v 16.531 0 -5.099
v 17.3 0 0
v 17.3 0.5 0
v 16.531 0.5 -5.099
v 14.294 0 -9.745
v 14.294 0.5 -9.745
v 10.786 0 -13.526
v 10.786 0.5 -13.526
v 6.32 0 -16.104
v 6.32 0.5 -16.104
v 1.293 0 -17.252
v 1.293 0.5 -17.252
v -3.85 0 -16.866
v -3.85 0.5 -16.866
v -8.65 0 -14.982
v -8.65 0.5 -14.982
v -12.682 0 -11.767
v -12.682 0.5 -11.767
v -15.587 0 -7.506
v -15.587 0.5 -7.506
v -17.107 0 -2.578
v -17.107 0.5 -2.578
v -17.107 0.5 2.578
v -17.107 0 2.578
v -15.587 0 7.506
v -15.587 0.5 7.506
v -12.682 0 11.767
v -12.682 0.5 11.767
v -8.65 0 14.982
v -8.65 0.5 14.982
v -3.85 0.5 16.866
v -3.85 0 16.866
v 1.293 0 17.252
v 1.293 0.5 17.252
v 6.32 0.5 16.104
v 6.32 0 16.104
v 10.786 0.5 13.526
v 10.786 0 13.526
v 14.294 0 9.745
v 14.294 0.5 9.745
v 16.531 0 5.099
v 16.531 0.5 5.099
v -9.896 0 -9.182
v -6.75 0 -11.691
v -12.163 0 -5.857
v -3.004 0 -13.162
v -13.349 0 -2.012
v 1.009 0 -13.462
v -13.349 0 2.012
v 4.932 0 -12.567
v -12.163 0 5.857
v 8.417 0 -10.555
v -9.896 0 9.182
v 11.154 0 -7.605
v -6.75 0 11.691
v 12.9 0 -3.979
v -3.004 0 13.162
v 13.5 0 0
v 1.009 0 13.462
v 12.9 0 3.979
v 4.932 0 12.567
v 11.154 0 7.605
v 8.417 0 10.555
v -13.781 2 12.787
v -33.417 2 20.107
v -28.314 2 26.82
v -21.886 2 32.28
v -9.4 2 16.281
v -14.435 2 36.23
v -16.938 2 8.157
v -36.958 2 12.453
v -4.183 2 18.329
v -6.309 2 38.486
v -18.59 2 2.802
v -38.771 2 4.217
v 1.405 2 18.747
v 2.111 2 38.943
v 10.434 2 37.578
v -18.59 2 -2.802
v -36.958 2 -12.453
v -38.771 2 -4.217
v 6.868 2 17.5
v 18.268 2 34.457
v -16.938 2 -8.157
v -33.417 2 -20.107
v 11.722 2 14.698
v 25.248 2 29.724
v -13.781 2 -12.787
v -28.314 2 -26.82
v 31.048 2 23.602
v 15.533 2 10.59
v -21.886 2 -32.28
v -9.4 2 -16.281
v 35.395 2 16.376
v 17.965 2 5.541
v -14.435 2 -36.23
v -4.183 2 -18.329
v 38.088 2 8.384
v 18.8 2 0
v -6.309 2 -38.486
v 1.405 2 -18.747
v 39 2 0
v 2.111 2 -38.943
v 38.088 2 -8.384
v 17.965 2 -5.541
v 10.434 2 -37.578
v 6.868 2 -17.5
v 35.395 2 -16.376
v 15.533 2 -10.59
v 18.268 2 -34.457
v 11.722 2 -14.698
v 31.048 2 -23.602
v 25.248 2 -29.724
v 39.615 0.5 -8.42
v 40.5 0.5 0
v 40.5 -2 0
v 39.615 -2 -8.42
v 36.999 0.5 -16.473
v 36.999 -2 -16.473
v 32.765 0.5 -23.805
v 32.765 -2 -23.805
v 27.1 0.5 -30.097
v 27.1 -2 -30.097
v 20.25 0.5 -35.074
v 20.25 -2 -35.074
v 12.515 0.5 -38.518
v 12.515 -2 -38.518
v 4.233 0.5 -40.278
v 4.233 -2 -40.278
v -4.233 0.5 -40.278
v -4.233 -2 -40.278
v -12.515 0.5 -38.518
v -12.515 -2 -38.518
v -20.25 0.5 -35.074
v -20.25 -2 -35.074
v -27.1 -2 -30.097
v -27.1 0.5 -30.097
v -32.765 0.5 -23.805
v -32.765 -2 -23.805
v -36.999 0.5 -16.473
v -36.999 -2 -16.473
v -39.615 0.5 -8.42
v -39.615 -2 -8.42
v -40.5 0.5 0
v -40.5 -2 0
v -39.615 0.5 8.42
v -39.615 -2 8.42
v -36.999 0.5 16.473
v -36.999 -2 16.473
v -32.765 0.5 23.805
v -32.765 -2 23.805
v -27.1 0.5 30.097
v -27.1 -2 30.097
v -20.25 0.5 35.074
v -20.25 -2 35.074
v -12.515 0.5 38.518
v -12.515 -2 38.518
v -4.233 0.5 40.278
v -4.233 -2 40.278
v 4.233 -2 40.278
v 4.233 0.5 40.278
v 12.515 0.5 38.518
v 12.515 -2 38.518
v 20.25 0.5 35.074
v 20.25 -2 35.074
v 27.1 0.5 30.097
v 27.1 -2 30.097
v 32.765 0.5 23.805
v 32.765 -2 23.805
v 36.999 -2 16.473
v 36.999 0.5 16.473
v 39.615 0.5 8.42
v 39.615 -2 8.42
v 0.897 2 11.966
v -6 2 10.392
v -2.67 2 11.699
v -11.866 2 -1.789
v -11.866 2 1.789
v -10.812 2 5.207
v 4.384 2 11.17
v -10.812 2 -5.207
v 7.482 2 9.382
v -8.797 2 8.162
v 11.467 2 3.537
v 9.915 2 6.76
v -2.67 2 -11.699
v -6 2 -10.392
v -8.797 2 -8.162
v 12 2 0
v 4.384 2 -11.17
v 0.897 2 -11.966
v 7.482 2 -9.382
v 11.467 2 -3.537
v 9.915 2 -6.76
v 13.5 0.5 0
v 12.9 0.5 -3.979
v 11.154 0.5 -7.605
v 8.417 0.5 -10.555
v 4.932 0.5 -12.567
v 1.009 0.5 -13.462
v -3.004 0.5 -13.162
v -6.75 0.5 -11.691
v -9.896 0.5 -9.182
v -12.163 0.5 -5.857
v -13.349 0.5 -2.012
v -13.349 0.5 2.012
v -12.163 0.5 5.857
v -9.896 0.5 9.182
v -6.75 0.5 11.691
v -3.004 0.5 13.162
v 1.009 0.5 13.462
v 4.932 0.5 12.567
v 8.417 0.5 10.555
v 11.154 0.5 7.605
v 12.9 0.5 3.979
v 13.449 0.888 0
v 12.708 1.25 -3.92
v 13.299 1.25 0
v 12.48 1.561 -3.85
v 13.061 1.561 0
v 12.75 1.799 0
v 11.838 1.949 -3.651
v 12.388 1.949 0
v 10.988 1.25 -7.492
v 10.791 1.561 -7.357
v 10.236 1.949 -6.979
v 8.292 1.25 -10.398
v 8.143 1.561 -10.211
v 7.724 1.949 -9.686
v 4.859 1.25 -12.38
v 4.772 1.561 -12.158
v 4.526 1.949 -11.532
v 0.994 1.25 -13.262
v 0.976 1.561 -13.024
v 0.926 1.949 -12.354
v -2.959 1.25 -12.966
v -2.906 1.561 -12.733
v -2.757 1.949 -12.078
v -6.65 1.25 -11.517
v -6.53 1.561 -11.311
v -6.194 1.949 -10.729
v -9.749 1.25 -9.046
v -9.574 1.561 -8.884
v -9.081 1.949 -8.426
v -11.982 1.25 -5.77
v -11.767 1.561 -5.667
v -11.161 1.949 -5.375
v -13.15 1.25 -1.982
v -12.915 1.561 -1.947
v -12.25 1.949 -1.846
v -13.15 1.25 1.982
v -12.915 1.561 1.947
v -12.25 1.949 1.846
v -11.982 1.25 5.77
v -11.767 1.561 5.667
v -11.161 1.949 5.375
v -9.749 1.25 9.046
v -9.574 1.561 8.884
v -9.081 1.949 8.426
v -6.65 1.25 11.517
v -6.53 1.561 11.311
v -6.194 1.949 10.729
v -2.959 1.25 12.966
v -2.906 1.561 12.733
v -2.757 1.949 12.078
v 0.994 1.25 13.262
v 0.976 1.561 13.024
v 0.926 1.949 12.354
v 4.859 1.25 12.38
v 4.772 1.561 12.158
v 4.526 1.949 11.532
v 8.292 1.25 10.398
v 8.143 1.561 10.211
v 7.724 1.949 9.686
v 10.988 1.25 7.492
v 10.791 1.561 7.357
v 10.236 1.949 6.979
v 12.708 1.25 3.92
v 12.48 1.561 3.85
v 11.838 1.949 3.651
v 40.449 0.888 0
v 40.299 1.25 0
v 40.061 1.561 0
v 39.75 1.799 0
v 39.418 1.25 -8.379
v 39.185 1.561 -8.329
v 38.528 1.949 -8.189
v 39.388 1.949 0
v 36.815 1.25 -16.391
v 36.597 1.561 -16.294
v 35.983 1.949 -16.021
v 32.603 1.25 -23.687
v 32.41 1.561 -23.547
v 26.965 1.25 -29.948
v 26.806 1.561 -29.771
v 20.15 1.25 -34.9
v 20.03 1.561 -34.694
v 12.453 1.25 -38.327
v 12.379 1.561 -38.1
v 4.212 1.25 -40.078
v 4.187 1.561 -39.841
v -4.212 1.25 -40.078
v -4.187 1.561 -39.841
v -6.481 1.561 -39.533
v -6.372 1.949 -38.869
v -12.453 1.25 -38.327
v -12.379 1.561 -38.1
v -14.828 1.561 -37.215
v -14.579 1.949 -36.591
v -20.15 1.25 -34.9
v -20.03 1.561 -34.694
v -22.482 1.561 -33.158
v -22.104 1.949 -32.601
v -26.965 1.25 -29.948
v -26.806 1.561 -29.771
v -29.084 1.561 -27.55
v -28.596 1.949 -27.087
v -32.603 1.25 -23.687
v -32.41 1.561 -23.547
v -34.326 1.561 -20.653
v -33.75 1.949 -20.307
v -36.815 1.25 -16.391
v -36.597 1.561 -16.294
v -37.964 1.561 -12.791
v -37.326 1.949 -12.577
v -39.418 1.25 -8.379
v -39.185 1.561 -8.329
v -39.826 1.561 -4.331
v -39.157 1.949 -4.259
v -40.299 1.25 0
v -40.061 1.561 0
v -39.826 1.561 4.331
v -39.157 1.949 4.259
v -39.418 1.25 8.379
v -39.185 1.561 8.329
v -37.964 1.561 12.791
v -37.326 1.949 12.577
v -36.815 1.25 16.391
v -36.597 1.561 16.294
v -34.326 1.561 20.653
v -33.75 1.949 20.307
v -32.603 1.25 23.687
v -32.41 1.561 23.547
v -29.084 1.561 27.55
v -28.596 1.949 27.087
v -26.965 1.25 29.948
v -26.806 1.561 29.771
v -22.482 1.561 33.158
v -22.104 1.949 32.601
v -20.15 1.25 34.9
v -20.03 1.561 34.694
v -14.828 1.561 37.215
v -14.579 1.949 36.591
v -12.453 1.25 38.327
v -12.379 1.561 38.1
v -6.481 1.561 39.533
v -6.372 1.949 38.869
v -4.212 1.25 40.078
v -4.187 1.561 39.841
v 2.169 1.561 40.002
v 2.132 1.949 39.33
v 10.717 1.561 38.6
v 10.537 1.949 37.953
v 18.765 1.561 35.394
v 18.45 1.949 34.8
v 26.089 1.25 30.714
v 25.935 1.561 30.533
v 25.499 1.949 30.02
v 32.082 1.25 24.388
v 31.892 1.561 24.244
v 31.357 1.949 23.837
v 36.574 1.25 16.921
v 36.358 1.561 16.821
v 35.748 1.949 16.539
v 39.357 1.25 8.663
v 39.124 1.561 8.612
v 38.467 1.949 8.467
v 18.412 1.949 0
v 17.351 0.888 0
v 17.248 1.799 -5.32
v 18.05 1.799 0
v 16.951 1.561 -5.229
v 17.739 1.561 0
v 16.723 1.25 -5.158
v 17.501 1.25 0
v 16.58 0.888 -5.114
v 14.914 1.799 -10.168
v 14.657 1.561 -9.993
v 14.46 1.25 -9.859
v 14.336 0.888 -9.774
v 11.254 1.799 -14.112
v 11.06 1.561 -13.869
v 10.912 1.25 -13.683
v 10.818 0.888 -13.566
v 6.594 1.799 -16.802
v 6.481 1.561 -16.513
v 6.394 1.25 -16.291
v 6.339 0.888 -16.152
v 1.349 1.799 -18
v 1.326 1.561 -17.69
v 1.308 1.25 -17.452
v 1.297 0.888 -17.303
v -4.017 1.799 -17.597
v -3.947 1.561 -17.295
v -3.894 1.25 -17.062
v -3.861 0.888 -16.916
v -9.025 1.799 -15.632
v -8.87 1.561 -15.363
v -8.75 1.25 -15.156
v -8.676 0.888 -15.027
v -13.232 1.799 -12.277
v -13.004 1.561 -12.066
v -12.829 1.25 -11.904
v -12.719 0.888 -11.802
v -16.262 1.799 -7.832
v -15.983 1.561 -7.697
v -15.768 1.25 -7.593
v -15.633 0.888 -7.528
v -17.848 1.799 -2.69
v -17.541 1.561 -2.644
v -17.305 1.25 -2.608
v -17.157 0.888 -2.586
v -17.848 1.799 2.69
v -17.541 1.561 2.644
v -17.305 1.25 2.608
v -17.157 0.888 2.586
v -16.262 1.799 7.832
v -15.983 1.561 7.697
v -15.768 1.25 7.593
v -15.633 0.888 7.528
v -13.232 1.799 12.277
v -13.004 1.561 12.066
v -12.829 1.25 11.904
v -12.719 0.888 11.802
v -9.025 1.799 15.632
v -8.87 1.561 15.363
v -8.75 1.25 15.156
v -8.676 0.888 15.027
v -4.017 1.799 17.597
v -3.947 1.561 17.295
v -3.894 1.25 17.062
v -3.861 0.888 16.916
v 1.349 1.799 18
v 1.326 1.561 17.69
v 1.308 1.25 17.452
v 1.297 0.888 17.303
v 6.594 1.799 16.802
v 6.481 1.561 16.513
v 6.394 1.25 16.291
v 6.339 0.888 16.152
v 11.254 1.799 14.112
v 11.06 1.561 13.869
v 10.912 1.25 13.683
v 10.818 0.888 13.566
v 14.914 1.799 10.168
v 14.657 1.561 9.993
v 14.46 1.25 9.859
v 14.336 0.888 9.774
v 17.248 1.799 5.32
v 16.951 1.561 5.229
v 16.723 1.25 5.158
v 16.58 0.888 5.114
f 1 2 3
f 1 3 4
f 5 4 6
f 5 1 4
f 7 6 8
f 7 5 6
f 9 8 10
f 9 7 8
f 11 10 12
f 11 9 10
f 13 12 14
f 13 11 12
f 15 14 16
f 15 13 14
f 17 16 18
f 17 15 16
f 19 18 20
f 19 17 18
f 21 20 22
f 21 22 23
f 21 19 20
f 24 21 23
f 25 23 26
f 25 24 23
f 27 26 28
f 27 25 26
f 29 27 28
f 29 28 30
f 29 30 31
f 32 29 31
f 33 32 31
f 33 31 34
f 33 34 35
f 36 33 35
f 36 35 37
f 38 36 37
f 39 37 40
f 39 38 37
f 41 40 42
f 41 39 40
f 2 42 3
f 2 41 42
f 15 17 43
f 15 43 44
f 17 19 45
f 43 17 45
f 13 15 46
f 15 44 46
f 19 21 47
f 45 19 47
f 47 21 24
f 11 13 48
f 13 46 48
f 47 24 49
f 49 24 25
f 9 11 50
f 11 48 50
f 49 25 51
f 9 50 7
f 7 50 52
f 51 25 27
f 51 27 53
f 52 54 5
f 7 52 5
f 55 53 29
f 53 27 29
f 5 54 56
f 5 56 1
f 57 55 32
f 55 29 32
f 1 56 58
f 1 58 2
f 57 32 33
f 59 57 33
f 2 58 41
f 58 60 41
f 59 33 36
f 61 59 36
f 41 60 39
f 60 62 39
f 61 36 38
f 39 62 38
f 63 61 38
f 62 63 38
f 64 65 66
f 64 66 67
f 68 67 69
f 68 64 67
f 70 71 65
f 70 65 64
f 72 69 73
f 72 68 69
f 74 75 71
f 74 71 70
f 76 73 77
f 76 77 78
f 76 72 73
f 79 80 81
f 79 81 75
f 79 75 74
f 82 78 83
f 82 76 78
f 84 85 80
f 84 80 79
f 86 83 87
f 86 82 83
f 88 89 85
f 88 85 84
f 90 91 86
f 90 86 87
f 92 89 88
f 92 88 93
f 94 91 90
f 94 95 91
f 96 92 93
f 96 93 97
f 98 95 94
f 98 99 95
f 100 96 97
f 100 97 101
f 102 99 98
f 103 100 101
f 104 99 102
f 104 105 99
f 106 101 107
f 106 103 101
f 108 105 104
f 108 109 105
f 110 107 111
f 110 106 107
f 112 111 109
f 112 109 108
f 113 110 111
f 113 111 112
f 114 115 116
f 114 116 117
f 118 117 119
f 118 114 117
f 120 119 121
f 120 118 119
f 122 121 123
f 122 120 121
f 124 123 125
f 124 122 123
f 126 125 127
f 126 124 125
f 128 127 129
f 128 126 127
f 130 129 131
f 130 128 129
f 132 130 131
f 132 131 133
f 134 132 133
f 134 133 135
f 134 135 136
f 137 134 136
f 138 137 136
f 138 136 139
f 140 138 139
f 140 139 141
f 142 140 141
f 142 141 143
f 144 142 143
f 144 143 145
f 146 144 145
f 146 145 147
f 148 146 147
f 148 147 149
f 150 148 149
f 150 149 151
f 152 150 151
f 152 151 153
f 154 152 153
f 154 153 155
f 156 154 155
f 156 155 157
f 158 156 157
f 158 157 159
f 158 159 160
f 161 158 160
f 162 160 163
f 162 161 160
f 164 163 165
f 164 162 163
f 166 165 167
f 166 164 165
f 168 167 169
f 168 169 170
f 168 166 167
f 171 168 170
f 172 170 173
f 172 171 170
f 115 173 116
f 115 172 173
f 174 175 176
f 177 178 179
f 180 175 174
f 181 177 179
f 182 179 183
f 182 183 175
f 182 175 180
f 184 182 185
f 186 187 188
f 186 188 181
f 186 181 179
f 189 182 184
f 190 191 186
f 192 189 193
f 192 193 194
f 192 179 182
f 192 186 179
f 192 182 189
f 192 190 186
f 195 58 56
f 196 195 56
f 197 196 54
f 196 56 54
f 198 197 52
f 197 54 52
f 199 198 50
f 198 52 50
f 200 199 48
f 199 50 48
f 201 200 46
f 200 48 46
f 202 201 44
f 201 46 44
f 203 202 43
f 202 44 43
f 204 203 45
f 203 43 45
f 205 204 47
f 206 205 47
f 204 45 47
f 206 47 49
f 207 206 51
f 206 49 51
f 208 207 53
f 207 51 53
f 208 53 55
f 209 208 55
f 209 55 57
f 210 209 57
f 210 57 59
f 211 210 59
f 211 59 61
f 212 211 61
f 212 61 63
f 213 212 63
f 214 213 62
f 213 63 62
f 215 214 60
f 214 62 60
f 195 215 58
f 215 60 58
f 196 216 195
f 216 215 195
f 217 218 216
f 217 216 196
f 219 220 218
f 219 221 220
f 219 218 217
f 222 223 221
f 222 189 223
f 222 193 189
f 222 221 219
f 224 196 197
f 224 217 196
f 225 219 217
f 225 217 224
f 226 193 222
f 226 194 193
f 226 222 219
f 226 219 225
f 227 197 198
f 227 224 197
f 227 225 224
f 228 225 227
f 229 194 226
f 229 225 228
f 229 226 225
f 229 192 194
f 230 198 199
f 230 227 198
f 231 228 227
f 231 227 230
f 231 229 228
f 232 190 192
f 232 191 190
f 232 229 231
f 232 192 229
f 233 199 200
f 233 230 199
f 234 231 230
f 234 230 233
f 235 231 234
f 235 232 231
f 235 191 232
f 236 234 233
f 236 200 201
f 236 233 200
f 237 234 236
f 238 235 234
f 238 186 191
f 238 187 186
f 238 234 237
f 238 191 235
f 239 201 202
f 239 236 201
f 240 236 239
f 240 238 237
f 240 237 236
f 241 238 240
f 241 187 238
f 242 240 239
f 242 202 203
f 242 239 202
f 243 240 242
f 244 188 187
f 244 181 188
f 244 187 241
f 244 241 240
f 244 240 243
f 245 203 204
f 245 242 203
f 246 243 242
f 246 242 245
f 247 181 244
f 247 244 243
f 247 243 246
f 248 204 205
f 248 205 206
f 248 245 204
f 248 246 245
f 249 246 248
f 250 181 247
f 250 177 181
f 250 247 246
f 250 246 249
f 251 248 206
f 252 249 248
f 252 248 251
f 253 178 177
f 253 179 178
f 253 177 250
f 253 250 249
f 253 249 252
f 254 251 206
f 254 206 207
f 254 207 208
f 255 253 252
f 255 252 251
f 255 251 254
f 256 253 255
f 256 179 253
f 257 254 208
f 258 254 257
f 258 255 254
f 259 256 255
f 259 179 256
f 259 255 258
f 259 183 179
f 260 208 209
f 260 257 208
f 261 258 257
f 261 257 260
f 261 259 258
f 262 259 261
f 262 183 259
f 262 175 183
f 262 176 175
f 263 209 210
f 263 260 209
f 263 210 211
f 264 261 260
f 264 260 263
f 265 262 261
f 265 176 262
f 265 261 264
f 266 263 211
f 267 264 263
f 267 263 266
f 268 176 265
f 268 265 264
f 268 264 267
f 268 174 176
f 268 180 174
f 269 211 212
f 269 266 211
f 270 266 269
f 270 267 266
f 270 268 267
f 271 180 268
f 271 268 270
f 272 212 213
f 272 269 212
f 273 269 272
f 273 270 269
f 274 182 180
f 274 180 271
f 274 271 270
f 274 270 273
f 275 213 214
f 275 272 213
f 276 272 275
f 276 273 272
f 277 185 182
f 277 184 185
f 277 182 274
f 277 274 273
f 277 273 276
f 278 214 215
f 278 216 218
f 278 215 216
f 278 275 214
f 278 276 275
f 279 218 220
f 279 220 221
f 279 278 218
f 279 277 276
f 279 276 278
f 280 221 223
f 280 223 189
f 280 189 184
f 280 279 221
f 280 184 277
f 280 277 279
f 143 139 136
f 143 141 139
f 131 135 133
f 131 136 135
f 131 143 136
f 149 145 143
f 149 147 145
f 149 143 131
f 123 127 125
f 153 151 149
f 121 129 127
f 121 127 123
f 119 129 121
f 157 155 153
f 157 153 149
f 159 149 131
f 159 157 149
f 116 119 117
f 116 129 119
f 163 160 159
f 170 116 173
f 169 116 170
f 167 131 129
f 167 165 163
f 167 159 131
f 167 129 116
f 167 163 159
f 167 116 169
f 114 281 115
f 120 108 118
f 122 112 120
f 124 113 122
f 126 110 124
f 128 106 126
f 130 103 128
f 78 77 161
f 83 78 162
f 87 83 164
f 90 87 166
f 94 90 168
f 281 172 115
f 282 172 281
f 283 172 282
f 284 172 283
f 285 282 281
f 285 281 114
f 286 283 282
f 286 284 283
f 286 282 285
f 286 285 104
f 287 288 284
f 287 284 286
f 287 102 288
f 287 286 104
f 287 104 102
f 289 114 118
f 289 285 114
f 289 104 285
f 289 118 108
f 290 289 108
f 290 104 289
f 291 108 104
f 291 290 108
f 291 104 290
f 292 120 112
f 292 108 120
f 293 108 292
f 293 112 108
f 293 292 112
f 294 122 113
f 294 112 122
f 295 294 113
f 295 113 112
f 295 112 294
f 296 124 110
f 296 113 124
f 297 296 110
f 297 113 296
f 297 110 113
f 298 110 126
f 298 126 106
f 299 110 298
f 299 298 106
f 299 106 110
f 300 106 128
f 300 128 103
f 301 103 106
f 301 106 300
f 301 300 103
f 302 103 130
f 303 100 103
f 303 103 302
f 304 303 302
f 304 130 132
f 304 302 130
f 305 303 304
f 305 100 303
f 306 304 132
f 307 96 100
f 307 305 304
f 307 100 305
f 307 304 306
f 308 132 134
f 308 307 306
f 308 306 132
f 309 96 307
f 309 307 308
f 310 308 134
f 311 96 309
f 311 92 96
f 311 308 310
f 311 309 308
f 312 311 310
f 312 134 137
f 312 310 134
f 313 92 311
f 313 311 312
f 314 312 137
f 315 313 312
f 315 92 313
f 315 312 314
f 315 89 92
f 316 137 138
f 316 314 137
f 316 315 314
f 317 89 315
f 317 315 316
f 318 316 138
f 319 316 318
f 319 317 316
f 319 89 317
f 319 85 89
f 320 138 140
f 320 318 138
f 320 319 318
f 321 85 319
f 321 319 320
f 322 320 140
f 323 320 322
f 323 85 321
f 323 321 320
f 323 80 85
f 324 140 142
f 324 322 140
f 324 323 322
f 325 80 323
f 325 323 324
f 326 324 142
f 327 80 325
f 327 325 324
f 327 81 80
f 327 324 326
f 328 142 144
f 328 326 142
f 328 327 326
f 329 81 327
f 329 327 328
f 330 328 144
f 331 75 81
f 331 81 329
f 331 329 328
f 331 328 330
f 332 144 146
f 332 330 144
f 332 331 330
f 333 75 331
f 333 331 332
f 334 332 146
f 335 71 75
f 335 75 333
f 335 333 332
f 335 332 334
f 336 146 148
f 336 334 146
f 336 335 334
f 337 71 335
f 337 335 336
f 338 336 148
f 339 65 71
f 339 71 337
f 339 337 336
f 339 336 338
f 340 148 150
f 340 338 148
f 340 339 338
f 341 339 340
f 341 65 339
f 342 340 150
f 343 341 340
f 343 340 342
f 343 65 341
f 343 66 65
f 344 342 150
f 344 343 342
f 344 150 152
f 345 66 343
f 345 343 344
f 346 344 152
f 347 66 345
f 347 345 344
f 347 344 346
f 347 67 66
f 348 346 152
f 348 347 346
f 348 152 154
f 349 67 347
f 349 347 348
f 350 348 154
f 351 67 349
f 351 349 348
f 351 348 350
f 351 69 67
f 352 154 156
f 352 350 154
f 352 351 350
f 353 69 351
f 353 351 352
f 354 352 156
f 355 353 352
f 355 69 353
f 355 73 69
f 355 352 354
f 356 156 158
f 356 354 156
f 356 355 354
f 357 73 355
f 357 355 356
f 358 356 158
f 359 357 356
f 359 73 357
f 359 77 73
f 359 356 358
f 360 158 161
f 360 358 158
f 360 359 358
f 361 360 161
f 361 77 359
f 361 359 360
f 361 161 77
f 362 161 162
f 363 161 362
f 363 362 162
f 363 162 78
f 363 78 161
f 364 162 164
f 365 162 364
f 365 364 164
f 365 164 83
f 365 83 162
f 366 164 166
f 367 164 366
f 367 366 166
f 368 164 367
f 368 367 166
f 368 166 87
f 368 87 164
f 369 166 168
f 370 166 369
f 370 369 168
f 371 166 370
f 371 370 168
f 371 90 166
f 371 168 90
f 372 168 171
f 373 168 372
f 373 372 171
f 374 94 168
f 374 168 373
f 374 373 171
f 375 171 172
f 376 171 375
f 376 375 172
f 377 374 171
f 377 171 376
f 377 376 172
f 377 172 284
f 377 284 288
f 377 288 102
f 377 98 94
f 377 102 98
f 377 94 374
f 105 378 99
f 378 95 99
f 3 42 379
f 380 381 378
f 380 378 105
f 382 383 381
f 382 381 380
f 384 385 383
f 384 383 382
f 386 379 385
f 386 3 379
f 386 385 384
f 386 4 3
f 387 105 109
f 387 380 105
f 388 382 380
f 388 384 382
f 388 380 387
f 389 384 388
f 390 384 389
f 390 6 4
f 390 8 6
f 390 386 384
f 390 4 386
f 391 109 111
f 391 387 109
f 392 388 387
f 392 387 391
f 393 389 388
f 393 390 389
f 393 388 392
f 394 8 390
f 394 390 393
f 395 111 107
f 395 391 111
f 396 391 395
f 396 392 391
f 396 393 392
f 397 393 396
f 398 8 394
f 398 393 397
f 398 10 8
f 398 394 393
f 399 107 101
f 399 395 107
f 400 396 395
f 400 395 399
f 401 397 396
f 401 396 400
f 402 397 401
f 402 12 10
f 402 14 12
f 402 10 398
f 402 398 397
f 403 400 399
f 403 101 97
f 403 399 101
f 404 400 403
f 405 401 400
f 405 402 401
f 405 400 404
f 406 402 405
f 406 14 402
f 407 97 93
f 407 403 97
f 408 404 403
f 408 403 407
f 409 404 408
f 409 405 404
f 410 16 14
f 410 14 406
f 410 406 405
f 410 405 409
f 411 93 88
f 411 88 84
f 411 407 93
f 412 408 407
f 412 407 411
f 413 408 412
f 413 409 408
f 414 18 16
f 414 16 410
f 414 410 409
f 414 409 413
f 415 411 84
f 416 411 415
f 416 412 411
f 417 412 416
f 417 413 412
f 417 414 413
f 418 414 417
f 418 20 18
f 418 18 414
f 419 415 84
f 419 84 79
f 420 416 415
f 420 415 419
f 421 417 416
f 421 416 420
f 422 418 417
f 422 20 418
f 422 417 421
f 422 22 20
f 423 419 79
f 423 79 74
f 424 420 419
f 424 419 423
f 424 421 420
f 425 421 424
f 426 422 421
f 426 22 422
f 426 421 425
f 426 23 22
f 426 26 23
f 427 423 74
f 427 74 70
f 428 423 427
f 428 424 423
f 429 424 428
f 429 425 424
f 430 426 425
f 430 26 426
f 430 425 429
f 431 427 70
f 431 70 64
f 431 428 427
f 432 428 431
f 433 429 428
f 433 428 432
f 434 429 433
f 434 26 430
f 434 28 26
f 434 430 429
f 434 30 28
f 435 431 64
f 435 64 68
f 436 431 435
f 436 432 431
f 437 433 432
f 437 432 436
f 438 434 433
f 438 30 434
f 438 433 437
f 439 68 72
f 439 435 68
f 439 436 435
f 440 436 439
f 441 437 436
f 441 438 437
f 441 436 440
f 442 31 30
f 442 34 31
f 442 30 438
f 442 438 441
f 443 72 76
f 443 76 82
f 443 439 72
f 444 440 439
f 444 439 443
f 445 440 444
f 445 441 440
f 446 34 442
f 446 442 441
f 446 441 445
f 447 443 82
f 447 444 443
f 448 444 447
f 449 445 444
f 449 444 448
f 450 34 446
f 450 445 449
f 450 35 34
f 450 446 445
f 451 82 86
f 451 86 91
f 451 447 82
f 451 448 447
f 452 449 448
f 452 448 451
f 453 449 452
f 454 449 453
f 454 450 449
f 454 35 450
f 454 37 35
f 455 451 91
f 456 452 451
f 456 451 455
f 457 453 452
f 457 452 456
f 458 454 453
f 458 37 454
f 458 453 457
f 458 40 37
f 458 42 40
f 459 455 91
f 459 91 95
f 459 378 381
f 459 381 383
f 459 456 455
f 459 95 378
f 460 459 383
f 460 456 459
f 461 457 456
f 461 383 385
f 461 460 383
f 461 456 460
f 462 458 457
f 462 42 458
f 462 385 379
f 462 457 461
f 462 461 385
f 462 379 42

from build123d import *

# Parameters (mm, degrees)
CROQUIS1_R              = 45
CROQUIS1_R_2            = 40.5
CROQUIS1_R_3            = 17.3
CROQUIS1_R_4            = 13.5
SALIENTE_EXTRUIR1_DEPTH = 2
CROQUIS2_R              = 45
SALIENTE_EXTRUIR2_DEPTH = 2
CROQUIS3_R              = 56.484635106
CROQUIS3_R_2            = 40.5
CORTAR_EXTRUIR1_DEPTH   = 10
REDONDEO2_R             = 1.5


with BuildPart() as part:
    # Croquis1 → Saliente-Extruir1 (new body)
    with BuildSketch(Plane(origin=(0, 0, 0), x_dir=(1, 0, 0), z_dir=(0, 1, 0))):
        Circle(CROQUIS1_R)
        Circle(CROQUIS1_R_2, mode=Mode.SUBTRACT)
        Circle(CROQUIS1_R_2)
        Circle(CROQUIS1_R_3, mode=Mode.SUBTRACT)
        Circle(CROQUIS1_R_4)
    extrude(amount=SALIENTE_EXTRUIR1_DEPTH)

    # Croquis2 → Saliente-Extruir2 (add)
    with BuildSketch(Plane.XZ):
        Circle(CROQUIS2_R)
    extrude(amount=SALIENTE_EXTRUIR2_DEPTH)

    # Croquis3 → Cortar-Extruir1 (cut)
    with BuildSketch(Plane(origin=(0, 2, 0), x_dir=(1, 0, 0), z_dir=(0, 1, 0))):
        Circle(CROQUIS3_R)
        Circle(CROQUIS3_R_2, mode=Mode.SUBTRACT)
    extrude(amount=-CORTAR_EXTRUIR1_DEPTH, mode=Mode.SUBTRACT)

    # Redondeo2
    redondeo2_edges = [part.edges().sort_by_distance(p)[0] for p in [
        (-13.5, 2, 0),
        (-40.5, 2, 0),
        (-17.3, 2, 0),
    ]]
    fillet(redondeo2_edges, radius=REDONDEO2_R)


solid = part.part
